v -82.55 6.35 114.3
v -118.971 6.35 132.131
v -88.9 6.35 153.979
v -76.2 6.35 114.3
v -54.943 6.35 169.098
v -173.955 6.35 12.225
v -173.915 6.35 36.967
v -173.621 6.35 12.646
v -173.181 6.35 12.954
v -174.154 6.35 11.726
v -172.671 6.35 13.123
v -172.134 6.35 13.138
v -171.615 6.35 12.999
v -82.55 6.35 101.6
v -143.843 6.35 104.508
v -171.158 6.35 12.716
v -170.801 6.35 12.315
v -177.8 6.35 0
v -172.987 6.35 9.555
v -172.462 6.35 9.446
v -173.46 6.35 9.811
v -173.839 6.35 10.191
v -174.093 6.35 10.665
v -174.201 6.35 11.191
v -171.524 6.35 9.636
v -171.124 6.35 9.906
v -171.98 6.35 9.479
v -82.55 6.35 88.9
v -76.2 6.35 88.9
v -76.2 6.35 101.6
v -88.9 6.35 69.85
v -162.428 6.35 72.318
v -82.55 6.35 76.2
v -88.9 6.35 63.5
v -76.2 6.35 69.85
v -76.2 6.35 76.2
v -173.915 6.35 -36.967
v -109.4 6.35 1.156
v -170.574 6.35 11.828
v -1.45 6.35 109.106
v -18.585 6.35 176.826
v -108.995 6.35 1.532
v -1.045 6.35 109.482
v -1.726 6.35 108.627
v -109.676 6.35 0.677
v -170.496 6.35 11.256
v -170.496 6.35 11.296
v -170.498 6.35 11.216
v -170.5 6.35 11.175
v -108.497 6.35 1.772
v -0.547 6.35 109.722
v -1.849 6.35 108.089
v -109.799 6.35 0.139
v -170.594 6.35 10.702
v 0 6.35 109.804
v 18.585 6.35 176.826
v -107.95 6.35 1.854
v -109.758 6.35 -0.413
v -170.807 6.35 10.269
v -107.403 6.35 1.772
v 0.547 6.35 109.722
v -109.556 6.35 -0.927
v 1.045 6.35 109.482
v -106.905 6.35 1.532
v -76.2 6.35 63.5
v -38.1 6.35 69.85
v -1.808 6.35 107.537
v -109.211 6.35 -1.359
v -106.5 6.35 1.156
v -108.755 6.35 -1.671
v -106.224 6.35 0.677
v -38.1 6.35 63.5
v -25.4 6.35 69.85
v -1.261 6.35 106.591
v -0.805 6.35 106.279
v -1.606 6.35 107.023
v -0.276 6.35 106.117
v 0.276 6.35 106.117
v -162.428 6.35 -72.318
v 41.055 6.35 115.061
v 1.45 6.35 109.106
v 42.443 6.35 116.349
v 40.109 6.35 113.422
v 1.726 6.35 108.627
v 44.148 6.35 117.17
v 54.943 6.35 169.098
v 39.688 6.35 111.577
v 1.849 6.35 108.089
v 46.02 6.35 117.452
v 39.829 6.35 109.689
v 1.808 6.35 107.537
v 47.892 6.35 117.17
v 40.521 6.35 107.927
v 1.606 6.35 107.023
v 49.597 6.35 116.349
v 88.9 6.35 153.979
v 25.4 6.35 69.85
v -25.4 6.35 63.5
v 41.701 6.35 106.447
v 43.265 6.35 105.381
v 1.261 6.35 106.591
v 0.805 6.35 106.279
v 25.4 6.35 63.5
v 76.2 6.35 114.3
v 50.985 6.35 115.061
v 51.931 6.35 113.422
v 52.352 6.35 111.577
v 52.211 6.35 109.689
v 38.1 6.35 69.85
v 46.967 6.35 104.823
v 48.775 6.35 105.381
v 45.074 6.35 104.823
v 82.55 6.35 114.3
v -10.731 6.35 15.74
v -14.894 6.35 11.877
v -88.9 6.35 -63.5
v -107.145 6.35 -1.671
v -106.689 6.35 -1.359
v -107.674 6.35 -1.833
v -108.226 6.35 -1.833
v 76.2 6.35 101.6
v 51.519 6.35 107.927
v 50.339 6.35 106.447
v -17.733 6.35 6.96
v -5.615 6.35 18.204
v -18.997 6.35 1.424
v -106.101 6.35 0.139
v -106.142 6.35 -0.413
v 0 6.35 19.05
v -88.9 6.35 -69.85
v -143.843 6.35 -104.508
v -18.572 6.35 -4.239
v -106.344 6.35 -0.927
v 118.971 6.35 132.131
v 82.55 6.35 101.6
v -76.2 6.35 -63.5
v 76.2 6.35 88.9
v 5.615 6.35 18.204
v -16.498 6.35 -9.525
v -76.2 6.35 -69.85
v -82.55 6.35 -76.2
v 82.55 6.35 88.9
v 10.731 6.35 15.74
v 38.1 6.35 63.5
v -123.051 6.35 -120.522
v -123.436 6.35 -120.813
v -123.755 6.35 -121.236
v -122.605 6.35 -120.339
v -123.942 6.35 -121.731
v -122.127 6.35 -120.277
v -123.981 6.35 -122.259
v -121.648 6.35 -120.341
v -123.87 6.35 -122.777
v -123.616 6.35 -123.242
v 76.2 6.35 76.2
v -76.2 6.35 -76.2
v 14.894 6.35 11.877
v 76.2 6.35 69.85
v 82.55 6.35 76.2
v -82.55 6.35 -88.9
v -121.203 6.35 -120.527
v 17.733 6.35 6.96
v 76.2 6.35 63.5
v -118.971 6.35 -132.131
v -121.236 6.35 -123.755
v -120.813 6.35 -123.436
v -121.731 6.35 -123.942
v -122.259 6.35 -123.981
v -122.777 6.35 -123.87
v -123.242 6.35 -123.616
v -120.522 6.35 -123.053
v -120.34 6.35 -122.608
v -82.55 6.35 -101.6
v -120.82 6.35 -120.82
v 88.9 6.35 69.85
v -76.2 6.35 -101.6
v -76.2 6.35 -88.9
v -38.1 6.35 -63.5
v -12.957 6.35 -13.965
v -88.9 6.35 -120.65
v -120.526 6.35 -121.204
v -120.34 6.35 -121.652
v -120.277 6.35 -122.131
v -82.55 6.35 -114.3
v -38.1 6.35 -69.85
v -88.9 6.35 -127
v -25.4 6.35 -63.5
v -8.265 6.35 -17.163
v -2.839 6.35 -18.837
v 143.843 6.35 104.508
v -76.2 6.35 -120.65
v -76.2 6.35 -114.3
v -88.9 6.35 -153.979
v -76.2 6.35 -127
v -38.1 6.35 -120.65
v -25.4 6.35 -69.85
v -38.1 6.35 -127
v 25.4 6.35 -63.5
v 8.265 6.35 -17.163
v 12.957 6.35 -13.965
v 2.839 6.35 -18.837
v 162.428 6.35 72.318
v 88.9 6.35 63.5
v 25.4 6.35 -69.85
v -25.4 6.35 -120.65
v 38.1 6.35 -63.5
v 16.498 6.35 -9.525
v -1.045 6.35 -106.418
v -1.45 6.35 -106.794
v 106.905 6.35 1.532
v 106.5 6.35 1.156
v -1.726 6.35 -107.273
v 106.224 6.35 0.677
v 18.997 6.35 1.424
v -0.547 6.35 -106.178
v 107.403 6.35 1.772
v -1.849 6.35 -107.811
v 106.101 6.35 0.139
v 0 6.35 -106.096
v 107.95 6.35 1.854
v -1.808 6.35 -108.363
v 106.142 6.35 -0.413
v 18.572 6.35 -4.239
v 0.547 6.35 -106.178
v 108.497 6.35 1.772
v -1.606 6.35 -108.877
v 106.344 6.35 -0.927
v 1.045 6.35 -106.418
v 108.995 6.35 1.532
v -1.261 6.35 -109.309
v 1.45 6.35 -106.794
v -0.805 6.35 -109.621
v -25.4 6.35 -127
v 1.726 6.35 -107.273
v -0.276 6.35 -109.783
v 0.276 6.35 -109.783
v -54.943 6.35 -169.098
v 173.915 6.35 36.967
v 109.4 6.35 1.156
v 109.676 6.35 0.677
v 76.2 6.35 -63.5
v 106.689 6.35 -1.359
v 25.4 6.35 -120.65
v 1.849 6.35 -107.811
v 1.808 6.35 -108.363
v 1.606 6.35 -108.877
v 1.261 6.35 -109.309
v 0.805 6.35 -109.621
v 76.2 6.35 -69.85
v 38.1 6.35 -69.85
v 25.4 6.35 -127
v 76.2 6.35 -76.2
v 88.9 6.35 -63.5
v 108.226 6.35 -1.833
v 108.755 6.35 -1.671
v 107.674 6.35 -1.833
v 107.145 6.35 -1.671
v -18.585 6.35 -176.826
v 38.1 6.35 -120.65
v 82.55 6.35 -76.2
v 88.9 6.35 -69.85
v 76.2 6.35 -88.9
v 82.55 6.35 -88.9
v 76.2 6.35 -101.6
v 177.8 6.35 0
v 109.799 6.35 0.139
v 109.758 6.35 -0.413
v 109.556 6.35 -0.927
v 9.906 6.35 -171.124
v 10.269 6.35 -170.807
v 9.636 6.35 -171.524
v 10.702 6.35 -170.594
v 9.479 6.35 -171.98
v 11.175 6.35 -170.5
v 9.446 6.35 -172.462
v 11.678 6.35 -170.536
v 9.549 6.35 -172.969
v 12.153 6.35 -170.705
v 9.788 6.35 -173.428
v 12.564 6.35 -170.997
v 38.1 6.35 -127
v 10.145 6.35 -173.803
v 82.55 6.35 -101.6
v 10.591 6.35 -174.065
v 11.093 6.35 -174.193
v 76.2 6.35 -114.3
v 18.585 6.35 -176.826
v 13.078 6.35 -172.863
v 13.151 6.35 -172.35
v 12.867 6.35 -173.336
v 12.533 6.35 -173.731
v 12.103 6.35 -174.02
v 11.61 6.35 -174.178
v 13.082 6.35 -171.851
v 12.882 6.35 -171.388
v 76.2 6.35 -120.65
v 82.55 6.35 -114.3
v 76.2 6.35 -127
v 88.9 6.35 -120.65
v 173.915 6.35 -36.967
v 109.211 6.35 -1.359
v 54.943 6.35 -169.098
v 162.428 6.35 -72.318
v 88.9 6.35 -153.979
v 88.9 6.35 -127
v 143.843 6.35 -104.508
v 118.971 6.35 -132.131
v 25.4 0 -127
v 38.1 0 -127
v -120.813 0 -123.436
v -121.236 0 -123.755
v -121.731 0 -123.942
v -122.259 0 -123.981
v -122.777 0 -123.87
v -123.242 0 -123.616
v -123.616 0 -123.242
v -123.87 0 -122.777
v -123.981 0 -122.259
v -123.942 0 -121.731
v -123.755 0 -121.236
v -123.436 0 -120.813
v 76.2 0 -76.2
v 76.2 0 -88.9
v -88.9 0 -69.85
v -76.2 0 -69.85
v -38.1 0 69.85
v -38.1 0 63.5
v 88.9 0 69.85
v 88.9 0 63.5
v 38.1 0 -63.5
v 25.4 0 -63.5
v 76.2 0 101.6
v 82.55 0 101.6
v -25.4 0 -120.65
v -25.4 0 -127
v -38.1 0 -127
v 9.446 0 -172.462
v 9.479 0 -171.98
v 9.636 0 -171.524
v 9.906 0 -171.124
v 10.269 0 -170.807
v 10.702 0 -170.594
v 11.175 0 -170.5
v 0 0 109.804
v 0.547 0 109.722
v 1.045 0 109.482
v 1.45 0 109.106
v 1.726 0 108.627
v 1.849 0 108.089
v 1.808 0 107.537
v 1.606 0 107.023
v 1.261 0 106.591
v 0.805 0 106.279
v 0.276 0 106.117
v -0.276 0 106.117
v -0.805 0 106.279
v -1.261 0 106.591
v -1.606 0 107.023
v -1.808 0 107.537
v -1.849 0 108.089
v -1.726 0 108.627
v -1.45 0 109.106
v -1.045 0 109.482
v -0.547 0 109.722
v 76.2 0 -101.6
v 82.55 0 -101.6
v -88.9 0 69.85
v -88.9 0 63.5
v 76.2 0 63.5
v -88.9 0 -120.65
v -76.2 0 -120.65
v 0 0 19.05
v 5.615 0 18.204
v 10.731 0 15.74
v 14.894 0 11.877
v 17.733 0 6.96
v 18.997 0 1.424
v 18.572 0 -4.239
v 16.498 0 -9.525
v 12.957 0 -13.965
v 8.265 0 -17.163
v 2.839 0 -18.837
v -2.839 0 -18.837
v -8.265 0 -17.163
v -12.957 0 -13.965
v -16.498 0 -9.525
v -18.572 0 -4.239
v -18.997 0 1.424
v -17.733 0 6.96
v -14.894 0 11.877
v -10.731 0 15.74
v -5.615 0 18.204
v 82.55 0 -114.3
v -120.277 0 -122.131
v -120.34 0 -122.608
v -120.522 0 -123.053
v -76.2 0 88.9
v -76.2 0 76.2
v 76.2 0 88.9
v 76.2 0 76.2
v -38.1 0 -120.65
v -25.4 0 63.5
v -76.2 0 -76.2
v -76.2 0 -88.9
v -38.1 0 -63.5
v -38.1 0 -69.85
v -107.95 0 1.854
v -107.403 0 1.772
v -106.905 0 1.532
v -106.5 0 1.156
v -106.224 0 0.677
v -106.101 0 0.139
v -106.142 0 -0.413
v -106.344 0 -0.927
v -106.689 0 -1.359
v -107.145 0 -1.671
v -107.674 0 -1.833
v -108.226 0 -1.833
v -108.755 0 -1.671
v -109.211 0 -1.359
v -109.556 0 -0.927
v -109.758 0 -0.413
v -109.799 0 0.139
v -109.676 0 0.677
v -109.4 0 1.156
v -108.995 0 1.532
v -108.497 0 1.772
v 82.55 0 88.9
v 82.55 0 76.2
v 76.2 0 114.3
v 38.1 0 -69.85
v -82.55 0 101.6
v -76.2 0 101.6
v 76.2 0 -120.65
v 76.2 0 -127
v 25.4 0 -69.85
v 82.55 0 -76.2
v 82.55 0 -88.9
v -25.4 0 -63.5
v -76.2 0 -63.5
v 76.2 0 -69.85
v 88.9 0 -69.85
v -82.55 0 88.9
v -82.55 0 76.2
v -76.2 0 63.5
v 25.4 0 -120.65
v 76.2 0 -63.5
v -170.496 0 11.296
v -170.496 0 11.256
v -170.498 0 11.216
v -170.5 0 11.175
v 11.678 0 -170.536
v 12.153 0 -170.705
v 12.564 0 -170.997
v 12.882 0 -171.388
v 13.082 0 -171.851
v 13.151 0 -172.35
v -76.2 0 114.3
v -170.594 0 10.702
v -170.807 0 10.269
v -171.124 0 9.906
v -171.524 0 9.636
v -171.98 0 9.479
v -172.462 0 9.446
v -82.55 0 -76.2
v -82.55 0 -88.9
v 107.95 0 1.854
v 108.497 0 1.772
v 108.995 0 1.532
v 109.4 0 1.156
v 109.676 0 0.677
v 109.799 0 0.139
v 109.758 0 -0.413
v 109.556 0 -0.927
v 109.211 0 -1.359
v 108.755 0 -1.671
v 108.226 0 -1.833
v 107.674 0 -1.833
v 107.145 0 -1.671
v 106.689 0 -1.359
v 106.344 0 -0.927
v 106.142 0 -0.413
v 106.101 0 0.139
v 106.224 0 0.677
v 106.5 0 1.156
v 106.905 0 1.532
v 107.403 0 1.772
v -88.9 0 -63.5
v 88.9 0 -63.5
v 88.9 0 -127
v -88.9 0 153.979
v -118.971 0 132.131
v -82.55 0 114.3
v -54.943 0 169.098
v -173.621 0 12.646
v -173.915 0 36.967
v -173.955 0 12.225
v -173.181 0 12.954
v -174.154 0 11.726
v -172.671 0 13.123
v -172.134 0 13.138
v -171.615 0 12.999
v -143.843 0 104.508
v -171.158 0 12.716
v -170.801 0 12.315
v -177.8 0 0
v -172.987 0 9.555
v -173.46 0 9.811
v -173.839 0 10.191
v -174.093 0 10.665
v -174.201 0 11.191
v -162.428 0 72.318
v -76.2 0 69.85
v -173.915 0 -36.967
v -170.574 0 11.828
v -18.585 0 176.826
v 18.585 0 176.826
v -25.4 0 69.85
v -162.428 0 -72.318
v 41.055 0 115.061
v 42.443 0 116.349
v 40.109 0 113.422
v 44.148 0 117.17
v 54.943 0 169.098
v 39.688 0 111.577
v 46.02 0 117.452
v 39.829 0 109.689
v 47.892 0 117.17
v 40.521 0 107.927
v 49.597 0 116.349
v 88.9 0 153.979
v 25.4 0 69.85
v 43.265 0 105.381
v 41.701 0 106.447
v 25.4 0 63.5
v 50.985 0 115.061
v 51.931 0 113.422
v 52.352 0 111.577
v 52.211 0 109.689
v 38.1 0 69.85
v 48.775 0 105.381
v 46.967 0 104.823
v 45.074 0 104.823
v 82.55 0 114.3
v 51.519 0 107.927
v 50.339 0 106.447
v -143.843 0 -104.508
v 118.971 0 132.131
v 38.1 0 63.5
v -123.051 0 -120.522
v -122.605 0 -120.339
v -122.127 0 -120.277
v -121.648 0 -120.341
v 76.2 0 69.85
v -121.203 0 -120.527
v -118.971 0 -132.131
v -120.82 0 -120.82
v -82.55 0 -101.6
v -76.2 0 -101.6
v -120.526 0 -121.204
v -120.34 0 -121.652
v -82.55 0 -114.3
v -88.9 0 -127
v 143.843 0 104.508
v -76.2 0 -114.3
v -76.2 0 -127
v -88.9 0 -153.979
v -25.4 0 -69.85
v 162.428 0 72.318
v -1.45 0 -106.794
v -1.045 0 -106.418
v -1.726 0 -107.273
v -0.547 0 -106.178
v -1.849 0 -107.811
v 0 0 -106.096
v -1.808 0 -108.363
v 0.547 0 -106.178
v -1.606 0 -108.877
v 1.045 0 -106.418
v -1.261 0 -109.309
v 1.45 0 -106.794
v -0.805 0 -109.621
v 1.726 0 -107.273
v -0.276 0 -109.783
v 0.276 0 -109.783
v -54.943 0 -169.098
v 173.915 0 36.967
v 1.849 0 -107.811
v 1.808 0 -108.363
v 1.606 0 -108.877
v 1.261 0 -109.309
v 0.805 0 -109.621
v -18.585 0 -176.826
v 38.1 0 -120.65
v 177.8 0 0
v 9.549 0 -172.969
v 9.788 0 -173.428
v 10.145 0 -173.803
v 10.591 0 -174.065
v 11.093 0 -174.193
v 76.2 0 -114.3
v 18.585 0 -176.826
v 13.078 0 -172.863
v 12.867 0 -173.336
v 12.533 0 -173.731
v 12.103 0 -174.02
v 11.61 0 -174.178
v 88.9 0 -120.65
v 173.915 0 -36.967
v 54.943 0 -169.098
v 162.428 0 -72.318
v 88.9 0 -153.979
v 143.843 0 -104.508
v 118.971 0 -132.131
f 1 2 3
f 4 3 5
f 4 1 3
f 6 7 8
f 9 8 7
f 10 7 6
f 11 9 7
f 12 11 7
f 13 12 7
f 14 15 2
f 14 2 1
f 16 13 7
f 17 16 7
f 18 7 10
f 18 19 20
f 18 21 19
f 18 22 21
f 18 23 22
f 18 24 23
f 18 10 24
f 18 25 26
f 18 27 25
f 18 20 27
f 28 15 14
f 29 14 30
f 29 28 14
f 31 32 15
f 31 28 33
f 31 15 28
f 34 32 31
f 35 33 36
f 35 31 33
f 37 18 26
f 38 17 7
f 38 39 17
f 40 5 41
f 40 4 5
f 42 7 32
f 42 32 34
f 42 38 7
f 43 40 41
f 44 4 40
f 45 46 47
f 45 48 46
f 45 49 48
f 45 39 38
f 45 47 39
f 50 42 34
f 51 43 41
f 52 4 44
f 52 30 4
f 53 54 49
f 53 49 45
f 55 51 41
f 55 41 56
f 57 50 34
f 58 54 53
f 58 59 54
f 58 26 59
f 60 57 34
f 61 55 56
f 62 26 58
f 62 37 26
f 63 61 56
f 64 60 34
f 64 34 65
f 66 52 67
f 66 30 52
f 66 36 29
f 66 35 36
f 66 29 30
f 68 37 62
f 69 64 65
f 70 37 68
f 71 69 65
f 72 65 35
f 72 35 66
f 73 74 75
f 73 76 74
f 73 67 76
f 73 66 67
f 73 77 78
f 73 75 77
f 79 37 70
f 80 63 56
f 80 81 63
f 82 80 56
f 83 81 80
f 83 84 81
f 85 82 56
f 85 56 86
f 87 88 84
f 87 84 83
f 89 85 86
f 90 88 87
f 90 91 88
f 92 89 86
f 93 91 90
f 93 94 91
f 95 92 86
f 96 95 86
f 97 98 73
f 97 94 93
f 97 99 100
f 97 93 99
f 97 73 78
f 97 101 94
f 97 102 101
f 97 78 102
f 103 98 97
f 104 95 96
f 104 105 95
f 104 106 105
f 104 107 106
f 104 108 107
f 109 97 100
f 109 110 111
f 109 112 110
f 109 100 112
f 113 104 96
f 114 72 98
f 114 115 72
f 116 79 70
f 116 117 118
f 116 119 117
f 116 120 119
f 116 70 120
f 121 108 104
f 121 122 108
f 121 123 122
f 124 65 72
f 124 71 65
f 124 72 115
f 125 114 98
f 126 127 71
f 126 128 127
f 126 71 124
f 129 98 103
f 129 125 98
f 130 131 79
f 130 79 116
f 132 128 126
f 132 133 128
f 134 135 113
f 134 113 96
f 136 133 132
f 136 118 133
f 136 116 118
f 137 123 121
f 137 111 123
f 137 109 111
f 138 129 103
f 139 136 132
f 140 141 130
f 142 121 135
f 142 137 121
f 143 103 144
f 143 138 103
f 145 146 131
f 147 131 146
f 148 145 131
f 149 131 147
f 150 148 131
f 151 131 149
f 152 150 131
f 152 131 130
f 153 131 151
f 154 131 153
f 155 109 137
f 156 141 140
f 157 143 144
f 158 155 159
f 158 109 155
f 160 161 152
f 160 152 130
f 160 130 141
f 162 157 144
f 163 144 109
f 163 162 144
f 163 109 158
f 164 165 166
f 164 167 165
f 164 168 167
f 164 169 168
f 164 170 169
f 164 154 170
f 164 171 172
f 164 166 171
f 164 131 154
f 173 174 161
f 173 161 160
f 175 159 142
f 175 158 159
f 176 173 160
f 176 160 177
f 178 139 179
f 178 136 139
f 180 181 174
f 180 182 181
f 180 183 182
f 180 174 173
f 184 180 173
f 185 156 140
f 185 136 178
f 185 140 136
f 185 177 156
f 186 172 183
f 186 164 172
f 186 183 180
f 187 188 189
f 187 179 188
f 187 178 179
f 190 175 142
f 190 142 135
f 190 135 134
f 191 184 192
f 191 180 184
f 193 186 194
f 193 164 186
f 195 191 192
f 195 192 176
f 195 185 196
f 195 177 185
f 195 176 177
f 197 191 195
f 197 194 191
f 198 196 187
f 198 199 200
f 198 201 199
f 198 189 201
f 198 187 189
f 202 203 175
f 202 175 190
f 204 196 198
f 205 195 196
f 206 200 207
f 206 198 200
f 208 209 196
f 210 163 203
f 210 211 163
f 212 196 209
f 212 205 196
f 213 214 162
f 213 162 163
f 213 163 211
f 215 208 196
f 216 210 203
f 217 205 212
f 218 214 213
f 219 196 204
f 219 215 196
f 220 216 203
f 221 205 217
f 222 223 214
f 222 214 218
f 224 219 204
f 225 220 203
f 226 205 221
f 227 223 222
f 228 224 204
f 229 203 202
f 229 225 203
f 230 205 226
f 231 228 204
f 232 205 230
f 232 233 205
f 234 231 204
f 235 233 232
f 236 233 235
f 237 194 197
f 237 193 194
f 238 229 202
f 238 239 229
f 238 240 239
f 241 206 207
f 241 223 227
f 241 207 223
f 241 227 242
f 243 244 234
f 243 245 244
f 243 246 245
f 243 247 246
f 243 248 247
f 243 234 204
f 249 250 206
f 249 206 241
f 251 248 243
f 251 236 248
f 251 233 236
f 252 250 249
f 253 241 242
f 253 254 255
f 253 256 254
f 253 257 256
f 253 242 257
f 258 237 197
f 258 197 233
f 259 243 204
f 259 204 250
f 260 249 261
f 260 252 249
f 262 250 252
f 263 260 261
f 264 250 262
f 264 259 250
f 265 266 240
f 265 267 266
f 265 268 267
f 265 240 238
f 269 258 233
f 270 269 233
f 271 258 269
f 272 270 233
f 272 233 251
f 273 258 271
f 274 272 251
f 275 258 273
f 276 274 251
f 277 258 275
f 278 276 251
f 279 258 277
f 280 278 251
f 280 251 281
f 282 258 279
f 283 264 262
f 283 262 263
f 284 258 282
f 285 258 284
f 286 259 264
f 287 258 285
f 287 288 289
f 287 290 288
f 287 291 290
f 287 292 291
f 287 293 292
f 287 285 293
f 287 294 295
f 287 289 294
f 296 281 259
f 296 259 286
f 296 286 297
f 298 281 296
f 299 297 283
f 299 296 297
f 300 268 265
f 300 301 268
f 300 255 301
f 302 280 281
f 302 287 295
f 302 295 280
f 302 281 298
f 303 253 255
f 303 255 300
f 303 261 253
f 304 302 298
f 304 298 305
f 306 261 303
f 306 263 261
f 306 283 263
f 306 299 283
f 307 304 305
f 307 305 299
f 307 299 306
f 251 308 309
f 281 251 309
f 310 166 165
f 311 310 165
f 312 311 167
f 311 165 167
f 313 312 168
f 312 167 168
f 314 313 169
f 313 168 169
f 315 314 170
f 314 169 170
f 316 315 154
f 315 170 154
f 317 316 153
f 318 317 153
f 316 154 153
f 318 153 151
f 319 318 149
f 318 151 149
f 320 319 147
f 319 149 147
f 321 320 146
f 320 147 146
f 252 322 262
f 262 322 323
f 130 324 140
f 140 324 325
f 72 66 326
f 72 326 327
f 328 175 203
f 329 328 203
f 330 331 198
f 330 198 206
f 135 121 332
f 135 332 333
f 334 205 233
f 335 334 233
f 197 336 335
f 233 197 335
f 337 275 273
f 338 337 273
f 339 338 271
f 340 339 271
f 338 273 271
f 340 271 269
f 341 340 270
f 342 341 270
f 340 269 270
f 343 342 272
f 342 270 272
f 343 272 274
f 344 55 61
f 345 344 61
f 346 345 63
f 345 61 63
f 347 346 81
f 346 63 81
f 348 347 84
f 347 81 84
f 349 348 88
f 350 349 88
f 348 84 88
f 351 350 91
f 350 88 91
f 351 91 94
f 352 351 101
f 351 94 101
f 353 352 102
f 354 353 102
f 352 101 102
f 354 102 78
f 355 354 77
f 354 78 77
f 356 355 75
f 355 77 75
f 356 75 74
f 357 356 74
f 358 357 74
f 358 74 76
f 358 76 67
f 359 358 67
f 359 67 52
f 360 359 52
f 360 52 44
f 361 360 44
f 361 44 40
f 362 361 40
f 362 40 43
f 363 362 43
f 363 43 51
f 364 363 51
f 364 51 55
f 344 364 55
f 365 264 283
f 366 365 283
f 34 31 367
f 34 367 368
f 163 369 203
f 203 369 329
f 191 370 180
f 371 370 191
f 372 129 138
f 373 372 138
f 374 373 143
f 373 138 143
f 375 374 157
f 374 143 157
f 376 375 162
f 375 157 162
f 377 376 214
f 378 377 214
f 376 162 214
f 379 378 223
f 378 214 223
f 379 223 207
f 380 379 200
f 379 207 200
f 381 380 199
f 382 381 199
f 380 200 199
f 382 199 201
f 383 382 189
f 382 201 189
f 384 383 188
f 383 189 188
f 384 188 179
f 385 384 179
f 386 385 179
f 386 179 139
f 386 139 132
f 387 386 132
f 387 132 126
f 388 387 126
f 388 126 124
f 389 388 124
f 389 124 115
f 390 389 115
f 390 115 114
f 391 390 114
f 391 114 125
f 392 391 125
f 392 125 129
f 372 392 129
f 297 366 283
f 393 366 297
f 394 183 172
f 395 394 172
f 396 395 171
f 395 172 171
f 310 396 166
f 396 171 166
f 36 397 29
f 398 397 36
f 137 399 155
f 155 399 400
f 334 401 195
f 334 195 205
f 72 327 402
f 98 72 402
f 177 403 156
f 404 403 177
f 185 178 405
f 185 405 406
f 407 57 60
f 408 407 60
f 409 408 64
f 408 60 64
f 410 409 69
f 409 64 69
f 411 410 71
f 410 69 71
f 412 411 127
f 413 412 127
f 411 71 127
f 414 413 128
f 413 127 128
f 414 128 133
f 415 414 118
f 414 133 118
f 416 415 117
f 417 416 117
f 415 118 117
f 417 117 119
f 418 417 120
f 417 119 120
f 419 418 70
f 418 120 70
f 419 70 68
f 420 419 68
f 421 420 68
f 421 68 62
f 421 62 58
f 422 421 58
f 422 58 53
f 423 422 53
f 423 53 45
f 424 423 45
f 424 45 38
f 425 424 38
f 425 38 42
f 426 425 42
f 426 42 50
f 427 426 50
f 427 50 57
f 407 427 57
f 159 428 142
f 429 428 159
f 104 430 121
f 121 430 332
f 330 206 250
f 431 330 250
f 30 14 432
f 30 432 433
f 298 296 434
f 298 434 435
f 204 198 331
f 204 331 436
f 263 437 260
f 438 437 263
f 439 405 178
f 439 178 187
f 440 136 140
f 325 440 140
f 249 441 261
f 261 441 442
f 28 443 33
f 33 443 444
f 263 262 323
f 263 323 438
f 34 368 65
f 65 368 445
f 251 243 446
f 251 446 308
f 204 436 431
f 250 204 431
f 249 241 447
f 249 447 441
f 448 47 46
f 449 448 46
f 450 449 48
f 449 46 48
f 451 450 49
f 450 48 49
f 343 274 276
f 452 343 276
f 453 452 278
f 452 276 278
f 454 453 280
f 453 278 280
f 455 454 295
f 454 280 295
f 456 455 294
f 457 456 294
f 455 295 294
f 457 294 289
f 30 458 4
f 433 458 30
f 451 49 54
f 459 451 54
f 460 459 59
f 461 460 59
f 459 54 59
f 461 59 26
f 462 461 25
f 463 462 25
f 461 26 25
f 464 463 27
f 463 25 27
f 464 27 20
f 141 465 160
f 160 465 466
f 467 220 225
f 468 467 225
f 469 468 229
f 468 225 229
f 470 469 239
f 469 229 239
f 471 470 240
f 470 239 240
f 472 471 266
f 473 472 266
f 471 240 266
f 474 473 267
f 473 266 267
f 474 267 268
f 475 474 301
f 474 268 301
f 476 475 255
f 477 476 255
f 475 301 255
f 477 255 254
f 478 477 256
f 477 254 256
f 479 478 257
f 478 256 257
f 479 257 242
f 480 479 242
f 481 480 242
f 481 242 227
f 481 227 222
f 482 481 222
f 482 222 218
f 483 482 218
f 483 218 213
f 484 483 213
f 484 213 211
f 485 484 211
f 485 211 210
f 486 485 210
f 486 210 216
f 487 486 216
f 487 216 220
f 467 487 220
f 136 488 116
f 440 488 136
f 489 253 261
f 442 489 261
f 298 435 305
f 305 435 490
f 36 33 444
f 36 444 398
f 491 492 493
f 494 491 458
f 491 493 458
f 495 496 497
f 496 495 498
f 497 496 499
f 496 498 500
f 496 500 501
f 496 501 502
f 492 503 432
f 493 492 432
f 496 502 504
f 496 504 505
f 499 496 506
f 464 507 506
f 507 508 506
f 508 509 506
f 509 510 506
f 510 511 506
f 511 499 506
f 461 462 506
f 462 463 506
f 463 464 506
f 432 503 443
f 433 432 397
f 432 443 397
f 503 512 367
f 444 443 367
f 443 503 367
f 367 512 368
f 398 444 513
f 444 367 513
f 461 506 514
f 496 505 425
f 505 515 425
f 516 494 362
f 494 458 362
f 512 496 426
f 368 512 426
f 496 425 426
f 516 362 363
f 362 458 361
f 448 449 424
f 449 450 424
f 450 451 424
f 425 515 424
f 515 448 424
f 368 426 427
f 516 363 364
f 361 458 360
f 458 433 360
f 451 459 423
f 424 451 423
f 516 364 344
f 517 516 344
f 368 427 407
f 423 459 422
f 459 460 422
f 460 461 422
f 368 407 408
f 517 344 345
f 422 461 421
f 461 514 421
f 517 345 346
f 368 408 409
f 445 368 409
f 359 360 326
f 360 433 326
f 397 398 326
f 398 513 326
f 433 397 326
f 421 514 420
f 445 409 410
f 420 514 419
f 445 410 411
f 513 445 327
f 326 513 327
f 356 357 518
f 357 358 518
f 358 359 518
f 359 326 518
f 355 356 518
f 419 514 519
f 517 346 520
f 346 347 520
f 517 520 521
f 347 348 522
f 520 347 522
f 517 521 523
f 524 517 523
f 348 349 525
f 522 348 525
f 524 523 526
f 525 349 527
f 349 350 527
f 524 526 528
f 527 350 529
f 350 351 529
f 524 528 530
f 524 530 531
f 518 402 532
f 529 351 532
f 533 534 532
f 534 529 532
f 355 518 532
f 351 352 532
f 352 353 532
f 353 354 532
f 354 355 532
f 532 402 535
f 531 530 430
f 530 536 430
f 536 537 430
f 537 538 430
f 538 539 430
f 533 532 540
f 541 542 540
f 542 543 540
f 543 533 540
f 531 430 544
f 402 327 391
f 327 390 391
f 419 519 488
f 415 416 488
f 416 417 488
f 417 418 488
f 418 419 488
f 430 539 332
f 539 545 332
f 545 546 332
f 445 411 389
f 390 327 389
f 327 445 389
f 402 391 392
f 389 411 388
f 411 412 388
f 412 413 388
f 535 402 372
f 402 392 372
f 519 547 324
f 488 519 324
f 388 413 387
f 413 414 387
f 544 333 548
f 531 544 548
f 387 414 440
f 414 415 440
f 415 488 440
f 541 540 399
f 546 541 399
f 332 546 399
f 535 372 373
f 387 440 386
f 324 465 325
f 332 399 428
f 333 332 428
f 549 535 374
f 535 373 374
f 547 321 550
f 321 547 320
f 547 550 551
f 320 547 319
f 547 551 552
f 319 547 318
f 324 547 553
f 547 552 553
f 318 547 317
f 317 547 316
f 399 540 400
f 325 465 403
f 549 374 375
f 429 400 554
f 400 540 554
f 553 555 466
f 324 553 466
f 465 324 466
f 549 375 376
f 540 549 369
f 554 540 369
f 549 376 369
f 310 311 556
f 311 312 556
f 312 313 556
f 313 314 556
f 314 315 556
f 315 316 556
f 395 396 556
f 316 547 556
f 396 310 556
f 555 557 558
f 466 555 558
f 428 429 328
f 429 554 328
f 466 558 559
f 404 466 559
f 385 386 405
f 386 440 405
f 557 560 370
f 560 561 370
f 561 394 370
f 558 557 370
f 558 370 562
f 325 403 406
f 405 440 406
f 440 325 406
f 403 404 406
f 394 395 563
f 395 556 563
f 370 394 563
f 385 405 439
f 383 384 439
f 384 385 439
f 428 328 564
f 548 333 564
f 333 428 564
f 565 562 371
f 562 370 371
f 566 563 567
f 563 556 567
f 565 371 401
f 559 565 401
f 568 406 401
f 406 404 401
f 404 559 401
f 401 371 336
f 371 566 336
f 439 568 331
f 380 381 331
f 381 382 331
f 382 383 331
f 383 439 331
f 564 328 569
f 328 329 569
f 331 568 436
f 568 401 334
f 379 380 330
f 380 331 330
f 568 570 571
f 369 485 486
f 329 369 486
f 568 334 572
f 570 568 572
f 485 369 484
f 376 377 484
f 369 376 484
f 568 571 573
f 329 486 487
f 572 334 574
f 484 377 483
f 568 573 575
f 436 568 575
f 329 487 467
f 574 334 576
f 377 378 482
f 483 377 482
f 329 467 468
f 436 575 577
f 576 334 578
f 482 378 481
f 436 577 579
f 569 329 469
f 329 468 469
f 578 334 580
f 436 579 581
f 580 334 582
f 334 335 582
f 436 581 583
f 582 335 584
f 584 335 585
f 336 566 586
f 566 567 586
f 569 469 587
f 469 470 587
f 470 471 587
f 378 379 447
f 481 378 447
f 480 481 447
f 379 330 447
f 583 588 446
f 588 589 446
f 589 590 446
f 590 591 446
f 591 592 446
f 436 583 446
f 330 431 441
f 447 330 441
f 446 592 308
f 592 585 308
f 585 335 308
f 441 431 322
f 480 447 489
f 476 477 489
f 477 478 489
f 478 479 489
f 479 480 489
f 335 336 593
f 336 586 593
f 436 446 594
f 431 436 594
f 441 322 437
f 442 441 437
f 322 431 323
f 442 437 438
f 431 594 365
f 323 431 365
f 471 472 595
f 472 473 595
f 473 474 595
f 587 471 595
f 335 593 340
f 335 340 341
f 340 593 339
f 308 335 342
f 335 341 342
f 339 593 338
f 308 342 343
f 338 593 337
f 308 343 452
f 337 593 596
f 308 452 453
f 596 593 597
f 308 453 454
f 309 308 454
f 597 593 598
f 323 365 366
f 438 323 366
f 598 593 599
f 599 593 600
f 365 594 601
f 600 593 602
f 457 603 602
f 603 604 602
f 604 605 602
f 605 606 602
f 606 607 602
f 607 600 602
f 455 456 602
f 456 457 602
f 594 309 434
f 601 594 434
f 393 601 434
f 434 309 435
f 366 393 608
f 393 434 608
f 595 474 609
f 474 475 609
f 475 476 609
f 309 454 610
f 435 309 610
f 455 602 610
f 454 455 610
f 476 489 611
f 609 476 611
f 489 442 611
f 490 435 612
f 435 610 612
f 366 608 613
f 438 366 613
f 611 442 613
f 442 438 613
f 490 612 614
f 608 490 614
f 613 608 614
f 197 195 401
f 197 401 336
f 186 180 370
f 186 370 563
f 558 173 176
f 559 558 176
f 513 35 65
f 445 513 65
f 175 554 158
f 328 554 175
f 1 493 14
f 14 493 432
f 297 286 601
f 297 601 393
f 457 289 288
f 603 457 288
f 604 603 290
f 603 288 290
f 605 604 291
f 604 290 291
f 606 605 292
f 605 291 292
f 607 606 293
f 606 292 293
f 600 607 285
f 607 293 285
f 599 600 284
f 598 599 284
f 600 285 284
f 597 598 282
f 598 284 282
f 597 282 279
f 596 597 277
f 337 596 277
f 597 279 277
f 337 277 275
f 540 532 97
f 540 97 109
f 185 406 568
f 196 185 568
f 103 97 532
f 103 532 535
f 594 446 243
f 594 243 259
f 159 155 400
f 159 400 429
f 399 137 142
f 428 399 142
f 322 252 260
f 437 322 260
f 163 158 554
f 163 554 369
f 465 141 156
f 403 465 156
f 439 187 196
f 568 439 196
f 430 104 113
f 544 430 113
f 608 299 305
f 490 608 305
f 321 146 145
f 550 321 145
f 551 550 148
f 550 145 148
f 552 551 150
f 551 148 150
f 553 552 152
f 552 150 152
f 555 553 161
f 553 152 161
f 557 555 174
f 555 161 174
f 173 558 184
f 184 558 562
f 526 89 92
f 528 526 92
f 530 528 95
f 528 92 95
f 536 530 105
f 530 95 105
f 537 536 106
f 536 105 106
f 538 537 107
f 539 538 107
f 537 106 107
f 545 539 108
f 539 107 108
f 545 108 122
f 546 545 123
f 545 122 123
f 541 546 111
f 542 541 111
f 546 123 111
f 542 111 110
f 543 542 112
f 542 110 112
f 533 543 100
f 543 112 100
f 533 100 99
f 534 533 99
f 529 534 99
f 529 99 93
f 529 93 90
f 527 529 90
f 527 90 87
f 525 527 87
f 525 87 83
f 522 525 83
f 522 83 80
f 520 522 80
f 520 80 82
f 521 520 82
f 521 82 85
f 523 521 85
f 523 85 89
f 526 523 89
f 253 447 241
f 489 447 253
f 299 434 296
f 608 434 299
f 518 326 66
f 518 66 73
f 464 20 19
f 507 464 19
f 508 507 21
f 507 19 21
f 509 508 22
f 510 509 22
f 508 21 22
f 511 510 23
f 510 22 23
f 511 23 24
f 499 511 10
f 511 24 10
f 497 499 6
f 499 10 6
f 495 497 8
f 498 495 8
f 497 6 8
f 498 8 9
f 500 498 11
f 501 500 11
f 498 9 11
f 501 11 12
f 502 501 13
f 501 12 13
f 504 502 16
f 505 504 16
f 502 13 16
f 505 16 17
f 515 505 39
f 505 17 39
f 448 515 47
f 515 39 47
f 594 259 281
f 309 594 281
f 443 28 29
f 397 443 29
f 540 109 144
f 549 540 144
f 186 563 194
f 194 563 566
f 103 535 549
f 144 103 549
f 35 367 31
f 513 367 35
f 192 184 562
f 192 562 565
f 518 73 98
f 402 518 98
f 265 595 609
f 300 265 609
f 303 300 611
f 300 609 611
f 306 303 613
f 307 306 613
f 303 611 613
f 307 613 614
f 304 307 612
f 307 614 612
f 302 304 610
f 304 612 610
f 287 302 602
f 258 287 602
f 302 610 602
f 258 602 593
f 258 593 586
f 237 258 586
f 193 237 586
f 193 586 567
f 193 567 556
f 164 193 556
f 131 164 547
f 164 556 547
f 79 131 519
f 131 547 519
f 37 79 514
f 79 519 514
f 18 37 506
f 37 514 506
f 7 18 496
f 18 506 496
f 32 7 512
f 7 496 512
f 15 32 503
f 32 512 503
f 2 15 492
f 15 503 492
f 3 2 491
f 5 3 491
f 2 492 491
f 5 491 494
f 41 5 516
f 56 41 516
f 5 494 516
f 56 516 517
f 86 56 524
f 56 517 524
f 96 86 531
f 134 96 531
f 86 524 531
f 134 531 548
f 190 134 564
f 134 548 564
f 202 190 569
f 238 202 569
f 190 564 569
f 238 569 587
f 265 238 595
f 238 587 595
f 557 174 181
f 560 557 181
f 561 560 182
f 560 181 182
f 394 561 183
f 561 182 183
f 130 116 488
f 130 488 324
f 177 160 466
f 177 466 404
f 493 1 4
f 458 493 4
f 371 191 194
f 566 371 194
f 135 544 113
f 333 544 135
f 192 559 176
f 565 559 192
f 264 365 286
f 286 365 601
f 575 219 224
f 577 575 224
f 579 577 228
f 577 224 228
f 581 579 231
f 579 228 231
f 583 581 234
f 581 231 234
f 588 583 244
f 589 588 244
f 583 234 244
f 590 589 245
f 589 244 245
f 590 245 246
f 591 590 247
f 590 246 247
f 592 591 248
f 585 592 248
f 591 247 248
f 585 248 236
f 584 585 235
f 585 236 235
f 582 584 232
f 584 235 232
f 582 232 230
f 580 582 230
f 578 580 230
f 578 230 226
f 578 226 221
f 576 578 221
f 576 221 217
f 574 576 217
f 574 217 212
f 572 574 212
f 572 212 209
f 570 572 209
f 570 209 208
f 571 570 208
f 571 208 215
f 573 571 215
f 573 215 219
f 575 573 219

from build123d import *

# Parameters (mm, degrees)
MAIN_DISC_OUTLINE_R   = 177.8
MAIN_DISC_OUTLINE_W   = 6.35
MAIN_DISC_OUTLINE_H   = 12.7
MAIN_DISC_OUTLINE_W_2 = 12.7
MAIN_DISC_OUTLINE_H_2 = 6.35
MAIN_DISC_DEPTH       = 6.35
SKETCH2_R             = 19.05
SKETCH2_R_2           = 1.8542
SKETCH2_R_3           = 6.35
BEARING_HOLES_DEPTH   = 252.527339468
RACK_HOLES_DEPTH      = 252.527339468


# Read off the part's stored shape, not the designer's step: Main Disc
with BuildPart() as part:
    # Main Disc outline → Main Disc (new body)
    with BuildSketch(Plane(origin=(0, 0, 0), x_dir=(1, 0, 0), z_dir=(0, 1, 0))):
        Circle(MAIN_DISC_OUTLINE_R)
        with Locations((-79.375, -107.95)):
            Rectangle(MAIN_DISC_OUTLINE_W, MAIN_DISC_OUTLINE_H, mode=Mode.SUBTRACT)
        with Locations((-79.375, -82.55)):
            Rectangle(MAIN_DISC_OUTLINE_W, MAIN_DISC_OUTLINE_H, mode=Mode.SUBTRACT)
        with Locations((-82.55, -66.675)):
            Rectangle(MAIN_DISC_OUTLINE_W_2, MAIN_DISC_OUTLINE_H_2, mode=Mode.SUBTRACT)
        with Locations((-31.75, -66.675)):
            Rectangle(MAIN_DISC_OUTLINE_W_2, MAIN_DISC_OUTLINE_H_2, mode=Mode.SUBTRACT)
        with Locations((79.375, -107.95)):
            Rectangle(MAIN_DISC_OUTLINE_W, MAIN_DISC_OUTLINE_H, mode=Mode.SUBTRACT)
        with Locations((31.75, -66.675)):
            Rectangle(MAIN_DISC_OUTLINE_W_2, MAIN_DISC_OUTLINE_H_2, mode=Mode.SUBTRACT)
        with Locations((79.375, -82.55)):
            Rectangle(MAIN_DISC_OUTLINE_W, MAIN_DISC_OUTLINE_H, mode=Mode.SUBTRACT)
        with Locations((82.55, -66.675)):
            Rectangle(MAIN_DISC_OUTLINE_W_2, MAIN_DISC_OUTLINE_H_2, mode=Mode.SUBTRACT)
        with Locations((-82.55, 66.675)):
            Rectangle(MAIN_DISC_OUTLINE_W_2, MAIN_DISC_OUTLINE_H_2, mode=Mode.SUBTRACT)
        with Locations((-79.375, 82.55)):
            Rectangle(MAIN_DISC_OUTLINE_W, MAIN_DISC_OUTLINE_H, mode=Mode.SUBTRACT)
        with Locations((-31.75, 66.675)):
            Rectangle(MAIN_DISC_OUTLINE_W_2, MAIN_DISC_OUTLINE_H_2, mode=Mode.SUBTRACT)
        with Locations((-79.375, 107.95)):
            Rectangle(MAIN_DISC_OUTLINE_W, MAIN_DISC_OUTLINE_H, mode=Mode.SUBTRACT)
        with Locations((-82.55, 123.825)):
            Rectangle(MAIN_DISC_OUTLINE_W_2, MAIN_DISC_OUTLINE_H_2, mode=Mode.SUBTRACT)
        with Locations((-31.75, 123.825)):
            Rectangle(MAIN_DISC_OUTLINE_W_2, MAIN_DISC_OUTLINE_H_2, mode=Mode.SUBTRACT)
        with Locations((31.75, 66.675)):
            Rectangle(MAIN_DISC_OUTLINE_W_2, MAIN_DISC_OUTLINE_H_2, mode=Mode.SUBTRACT)
        with Locations((82.55, 66.675)):
            Rectangle(MAIN_DISC_OUTLINE_W_2, MAIN_DISC_OUTLINE_H_2, mode=Mode.SUBTRACT)
        with Locations((79.375, 82.55)):
            Rectangle(MAIN_DISC_OUTLINE_W, MAIN_DISC_OUTLINE_H, mode=Mode.SUBTRACT)
        with Locations((31.75, 123.825)):
            Rectangle(MAIN_DISC_OUTLINE_W_2, MAIN_DISC_OUTLINE_H_2, mode=Mode.SUBTRACT)
        with Locations((79.375, 107.95)):
            Rectangle(MAIN_DISC_OUTLINE_W, MAIN_DISC_OUTLINE_H, mode=Mode.SUBTRACT)
        with Locations((82.55, 123.825)):
            Rectangle(MAIN_DISC_OUTLINE_W_2, MAIN_DISC_OUTLINE_H_2, mode=Mode.SUBTRACT)
    extrude(amount=MAIN_DISC_DEPTH)

    # Sketch2 → Bearing Holes (cut, through all)
    with BuildSketch(Plane(origin=(0, 6.35, 0), x_dir=(1, 0, 0), z_dir=(0, 1, 0))):
        with Locations(Location((0, 0, 0), (0, 0, 270))):
            Circle(SKETCH2_R)
        with Locations(Location((0, -107.95, 0), (0, 0, 270))):
            Circle(SKETCH2_R_2)
        with Locations(Location((46.020093648, -111.102334226, 0), (0, 0, 270))):
            Circle(SKETCH2_R_3)
        with Locations(Location((107.95, 0, 0), (0, 0, 270))):
            Circle(SKETCH2_R_2)
        with Locations(Location((0, 107.95, 0), (0, 0, 270))):
            Circle(SKETCH2_R_2)
        with Locations(Location((-107.95, 0, 0), (0, 0, 270))):
            Circle(SKETCH2_R_2)
    extrude(amount=-BEARING_HOLES_DEPTH, mode=Mode.SUBTRACT)

    # Sketch3 → Rack Holes (cut, through all)
    with BuildSketch(Plane(origin=(0, 6.35, 0), x_dir=(1, 0, 0), z_dir=(0, 1, 0))):
        with BuildLine():
            ThreePointArc((-170.495993222, -11.296428481), (-170.496985984, -11.235760757), (-170.499963206, -11.175157998))
            Line((-170.499963206, -11.175157998), (-172.350193222, -11.296428481))
            ThreePointArc((-172.350193222, -11.296428481), (-172.4083456, -10.371150737), (-172.461530575, -9.445574182))
            ThreePointArc((-172.461530575, -9.445574182), (-173.621337572, -12.646335766), (-170.495993222, -11.296428481))
        make_face()
        with BuildLine():
            Line((-172.350193222, -11.296428481), (-170.499963206, -11.175157998))
            ThreePointArc((-170.499963206, -11.175157998), (-171.123897186, -9.905653275), (-172.461530575, -9.445574182))
            ThreePointArc((-172.461530575, -9.445574182), (-172.4083456, -10.371150737), (-172.350193222, -11.296428481))
        make_face()
        with BuildLine():
            ThreePointArc((-123.435544137, 120.813347125), (-122.126506883, 120.277289924), (-120.820365853, 120.820365853))
            Line((-120.820365853, 120.820365853), (-122.131483247, 122.131483247))
            ThreePointArc((-122.131483247, 122.131483247), (-122.785282527, 121.474165133), (-123.435544137, 120.813347125))
        make_face()
        with BuildLine():
            Line((-122.131483247, 122.131483247), (-120.820365853, 120.820365853))
            ThreePointArc((-120.820365853, 120.820365853), (-120.418425817, 121.421911626), (-120.277283247, 122.131483247))
            ThreePointArc((-120.277283247, 122.131483247), (-120.416527615, 122.836454751), (-120.813347125, 123.435544137))
            ThreePointArc((-120.813347125, 123.435544137), (-121.474165133, 122.785282527), (-122.131483247, 122.131483247))
        make_face()
        with BuildLine():
            ThreePointArc((-120.813347125, 123.435544137), (-123.44260064, 123.44260064), (-123.435544137, 120.813347125))
            ThreePointArc((-123.435544137, 120.813347125), (-122.785282527, 121.474165133), (-122.131483247, 122.131483247))
            ThreePointArc((-122.131483247, 122.131483247), (-121.474165133, 122.785282527), (-120.813347125, 123.435544137))
        make_face()
        with BuildLine():
            ThreePointArc((9.445574182, 172.461530575), (9.905653275, 171.123897186), (11.175157998, 170.499963206))
            Line((11.175157998, 170.499963206), (11.296428481, 172.350193222))
            ThreePointArc((11.296428481, 172.350193222), (10.371150737, 172.4083456), (9.445574182, 172.461530575))
        make_face()
        with BuildLine():
            Line((11.296428481, 172.350193222), (11.175157998, 170.499963206))
            ThreePointArc((11.175157998, 170.499963206), (12.563945327, 170.996879258), (13.150628481, 172.350193222))
            ThreePointArc((13.150628481, 172.350193222), (11.352122286, 174.203556608), (9.445574182, 172.461530575))
            ThreePointArc((9.445574182, 172.461530575), (10.371150737, 172.4083456), (11.296428481, 172.350193222))
        make_face()
    extrude(amount=-RACK_HOLES_DEPTH, mode=Mode.SUBTRACT)


solid = part.part
